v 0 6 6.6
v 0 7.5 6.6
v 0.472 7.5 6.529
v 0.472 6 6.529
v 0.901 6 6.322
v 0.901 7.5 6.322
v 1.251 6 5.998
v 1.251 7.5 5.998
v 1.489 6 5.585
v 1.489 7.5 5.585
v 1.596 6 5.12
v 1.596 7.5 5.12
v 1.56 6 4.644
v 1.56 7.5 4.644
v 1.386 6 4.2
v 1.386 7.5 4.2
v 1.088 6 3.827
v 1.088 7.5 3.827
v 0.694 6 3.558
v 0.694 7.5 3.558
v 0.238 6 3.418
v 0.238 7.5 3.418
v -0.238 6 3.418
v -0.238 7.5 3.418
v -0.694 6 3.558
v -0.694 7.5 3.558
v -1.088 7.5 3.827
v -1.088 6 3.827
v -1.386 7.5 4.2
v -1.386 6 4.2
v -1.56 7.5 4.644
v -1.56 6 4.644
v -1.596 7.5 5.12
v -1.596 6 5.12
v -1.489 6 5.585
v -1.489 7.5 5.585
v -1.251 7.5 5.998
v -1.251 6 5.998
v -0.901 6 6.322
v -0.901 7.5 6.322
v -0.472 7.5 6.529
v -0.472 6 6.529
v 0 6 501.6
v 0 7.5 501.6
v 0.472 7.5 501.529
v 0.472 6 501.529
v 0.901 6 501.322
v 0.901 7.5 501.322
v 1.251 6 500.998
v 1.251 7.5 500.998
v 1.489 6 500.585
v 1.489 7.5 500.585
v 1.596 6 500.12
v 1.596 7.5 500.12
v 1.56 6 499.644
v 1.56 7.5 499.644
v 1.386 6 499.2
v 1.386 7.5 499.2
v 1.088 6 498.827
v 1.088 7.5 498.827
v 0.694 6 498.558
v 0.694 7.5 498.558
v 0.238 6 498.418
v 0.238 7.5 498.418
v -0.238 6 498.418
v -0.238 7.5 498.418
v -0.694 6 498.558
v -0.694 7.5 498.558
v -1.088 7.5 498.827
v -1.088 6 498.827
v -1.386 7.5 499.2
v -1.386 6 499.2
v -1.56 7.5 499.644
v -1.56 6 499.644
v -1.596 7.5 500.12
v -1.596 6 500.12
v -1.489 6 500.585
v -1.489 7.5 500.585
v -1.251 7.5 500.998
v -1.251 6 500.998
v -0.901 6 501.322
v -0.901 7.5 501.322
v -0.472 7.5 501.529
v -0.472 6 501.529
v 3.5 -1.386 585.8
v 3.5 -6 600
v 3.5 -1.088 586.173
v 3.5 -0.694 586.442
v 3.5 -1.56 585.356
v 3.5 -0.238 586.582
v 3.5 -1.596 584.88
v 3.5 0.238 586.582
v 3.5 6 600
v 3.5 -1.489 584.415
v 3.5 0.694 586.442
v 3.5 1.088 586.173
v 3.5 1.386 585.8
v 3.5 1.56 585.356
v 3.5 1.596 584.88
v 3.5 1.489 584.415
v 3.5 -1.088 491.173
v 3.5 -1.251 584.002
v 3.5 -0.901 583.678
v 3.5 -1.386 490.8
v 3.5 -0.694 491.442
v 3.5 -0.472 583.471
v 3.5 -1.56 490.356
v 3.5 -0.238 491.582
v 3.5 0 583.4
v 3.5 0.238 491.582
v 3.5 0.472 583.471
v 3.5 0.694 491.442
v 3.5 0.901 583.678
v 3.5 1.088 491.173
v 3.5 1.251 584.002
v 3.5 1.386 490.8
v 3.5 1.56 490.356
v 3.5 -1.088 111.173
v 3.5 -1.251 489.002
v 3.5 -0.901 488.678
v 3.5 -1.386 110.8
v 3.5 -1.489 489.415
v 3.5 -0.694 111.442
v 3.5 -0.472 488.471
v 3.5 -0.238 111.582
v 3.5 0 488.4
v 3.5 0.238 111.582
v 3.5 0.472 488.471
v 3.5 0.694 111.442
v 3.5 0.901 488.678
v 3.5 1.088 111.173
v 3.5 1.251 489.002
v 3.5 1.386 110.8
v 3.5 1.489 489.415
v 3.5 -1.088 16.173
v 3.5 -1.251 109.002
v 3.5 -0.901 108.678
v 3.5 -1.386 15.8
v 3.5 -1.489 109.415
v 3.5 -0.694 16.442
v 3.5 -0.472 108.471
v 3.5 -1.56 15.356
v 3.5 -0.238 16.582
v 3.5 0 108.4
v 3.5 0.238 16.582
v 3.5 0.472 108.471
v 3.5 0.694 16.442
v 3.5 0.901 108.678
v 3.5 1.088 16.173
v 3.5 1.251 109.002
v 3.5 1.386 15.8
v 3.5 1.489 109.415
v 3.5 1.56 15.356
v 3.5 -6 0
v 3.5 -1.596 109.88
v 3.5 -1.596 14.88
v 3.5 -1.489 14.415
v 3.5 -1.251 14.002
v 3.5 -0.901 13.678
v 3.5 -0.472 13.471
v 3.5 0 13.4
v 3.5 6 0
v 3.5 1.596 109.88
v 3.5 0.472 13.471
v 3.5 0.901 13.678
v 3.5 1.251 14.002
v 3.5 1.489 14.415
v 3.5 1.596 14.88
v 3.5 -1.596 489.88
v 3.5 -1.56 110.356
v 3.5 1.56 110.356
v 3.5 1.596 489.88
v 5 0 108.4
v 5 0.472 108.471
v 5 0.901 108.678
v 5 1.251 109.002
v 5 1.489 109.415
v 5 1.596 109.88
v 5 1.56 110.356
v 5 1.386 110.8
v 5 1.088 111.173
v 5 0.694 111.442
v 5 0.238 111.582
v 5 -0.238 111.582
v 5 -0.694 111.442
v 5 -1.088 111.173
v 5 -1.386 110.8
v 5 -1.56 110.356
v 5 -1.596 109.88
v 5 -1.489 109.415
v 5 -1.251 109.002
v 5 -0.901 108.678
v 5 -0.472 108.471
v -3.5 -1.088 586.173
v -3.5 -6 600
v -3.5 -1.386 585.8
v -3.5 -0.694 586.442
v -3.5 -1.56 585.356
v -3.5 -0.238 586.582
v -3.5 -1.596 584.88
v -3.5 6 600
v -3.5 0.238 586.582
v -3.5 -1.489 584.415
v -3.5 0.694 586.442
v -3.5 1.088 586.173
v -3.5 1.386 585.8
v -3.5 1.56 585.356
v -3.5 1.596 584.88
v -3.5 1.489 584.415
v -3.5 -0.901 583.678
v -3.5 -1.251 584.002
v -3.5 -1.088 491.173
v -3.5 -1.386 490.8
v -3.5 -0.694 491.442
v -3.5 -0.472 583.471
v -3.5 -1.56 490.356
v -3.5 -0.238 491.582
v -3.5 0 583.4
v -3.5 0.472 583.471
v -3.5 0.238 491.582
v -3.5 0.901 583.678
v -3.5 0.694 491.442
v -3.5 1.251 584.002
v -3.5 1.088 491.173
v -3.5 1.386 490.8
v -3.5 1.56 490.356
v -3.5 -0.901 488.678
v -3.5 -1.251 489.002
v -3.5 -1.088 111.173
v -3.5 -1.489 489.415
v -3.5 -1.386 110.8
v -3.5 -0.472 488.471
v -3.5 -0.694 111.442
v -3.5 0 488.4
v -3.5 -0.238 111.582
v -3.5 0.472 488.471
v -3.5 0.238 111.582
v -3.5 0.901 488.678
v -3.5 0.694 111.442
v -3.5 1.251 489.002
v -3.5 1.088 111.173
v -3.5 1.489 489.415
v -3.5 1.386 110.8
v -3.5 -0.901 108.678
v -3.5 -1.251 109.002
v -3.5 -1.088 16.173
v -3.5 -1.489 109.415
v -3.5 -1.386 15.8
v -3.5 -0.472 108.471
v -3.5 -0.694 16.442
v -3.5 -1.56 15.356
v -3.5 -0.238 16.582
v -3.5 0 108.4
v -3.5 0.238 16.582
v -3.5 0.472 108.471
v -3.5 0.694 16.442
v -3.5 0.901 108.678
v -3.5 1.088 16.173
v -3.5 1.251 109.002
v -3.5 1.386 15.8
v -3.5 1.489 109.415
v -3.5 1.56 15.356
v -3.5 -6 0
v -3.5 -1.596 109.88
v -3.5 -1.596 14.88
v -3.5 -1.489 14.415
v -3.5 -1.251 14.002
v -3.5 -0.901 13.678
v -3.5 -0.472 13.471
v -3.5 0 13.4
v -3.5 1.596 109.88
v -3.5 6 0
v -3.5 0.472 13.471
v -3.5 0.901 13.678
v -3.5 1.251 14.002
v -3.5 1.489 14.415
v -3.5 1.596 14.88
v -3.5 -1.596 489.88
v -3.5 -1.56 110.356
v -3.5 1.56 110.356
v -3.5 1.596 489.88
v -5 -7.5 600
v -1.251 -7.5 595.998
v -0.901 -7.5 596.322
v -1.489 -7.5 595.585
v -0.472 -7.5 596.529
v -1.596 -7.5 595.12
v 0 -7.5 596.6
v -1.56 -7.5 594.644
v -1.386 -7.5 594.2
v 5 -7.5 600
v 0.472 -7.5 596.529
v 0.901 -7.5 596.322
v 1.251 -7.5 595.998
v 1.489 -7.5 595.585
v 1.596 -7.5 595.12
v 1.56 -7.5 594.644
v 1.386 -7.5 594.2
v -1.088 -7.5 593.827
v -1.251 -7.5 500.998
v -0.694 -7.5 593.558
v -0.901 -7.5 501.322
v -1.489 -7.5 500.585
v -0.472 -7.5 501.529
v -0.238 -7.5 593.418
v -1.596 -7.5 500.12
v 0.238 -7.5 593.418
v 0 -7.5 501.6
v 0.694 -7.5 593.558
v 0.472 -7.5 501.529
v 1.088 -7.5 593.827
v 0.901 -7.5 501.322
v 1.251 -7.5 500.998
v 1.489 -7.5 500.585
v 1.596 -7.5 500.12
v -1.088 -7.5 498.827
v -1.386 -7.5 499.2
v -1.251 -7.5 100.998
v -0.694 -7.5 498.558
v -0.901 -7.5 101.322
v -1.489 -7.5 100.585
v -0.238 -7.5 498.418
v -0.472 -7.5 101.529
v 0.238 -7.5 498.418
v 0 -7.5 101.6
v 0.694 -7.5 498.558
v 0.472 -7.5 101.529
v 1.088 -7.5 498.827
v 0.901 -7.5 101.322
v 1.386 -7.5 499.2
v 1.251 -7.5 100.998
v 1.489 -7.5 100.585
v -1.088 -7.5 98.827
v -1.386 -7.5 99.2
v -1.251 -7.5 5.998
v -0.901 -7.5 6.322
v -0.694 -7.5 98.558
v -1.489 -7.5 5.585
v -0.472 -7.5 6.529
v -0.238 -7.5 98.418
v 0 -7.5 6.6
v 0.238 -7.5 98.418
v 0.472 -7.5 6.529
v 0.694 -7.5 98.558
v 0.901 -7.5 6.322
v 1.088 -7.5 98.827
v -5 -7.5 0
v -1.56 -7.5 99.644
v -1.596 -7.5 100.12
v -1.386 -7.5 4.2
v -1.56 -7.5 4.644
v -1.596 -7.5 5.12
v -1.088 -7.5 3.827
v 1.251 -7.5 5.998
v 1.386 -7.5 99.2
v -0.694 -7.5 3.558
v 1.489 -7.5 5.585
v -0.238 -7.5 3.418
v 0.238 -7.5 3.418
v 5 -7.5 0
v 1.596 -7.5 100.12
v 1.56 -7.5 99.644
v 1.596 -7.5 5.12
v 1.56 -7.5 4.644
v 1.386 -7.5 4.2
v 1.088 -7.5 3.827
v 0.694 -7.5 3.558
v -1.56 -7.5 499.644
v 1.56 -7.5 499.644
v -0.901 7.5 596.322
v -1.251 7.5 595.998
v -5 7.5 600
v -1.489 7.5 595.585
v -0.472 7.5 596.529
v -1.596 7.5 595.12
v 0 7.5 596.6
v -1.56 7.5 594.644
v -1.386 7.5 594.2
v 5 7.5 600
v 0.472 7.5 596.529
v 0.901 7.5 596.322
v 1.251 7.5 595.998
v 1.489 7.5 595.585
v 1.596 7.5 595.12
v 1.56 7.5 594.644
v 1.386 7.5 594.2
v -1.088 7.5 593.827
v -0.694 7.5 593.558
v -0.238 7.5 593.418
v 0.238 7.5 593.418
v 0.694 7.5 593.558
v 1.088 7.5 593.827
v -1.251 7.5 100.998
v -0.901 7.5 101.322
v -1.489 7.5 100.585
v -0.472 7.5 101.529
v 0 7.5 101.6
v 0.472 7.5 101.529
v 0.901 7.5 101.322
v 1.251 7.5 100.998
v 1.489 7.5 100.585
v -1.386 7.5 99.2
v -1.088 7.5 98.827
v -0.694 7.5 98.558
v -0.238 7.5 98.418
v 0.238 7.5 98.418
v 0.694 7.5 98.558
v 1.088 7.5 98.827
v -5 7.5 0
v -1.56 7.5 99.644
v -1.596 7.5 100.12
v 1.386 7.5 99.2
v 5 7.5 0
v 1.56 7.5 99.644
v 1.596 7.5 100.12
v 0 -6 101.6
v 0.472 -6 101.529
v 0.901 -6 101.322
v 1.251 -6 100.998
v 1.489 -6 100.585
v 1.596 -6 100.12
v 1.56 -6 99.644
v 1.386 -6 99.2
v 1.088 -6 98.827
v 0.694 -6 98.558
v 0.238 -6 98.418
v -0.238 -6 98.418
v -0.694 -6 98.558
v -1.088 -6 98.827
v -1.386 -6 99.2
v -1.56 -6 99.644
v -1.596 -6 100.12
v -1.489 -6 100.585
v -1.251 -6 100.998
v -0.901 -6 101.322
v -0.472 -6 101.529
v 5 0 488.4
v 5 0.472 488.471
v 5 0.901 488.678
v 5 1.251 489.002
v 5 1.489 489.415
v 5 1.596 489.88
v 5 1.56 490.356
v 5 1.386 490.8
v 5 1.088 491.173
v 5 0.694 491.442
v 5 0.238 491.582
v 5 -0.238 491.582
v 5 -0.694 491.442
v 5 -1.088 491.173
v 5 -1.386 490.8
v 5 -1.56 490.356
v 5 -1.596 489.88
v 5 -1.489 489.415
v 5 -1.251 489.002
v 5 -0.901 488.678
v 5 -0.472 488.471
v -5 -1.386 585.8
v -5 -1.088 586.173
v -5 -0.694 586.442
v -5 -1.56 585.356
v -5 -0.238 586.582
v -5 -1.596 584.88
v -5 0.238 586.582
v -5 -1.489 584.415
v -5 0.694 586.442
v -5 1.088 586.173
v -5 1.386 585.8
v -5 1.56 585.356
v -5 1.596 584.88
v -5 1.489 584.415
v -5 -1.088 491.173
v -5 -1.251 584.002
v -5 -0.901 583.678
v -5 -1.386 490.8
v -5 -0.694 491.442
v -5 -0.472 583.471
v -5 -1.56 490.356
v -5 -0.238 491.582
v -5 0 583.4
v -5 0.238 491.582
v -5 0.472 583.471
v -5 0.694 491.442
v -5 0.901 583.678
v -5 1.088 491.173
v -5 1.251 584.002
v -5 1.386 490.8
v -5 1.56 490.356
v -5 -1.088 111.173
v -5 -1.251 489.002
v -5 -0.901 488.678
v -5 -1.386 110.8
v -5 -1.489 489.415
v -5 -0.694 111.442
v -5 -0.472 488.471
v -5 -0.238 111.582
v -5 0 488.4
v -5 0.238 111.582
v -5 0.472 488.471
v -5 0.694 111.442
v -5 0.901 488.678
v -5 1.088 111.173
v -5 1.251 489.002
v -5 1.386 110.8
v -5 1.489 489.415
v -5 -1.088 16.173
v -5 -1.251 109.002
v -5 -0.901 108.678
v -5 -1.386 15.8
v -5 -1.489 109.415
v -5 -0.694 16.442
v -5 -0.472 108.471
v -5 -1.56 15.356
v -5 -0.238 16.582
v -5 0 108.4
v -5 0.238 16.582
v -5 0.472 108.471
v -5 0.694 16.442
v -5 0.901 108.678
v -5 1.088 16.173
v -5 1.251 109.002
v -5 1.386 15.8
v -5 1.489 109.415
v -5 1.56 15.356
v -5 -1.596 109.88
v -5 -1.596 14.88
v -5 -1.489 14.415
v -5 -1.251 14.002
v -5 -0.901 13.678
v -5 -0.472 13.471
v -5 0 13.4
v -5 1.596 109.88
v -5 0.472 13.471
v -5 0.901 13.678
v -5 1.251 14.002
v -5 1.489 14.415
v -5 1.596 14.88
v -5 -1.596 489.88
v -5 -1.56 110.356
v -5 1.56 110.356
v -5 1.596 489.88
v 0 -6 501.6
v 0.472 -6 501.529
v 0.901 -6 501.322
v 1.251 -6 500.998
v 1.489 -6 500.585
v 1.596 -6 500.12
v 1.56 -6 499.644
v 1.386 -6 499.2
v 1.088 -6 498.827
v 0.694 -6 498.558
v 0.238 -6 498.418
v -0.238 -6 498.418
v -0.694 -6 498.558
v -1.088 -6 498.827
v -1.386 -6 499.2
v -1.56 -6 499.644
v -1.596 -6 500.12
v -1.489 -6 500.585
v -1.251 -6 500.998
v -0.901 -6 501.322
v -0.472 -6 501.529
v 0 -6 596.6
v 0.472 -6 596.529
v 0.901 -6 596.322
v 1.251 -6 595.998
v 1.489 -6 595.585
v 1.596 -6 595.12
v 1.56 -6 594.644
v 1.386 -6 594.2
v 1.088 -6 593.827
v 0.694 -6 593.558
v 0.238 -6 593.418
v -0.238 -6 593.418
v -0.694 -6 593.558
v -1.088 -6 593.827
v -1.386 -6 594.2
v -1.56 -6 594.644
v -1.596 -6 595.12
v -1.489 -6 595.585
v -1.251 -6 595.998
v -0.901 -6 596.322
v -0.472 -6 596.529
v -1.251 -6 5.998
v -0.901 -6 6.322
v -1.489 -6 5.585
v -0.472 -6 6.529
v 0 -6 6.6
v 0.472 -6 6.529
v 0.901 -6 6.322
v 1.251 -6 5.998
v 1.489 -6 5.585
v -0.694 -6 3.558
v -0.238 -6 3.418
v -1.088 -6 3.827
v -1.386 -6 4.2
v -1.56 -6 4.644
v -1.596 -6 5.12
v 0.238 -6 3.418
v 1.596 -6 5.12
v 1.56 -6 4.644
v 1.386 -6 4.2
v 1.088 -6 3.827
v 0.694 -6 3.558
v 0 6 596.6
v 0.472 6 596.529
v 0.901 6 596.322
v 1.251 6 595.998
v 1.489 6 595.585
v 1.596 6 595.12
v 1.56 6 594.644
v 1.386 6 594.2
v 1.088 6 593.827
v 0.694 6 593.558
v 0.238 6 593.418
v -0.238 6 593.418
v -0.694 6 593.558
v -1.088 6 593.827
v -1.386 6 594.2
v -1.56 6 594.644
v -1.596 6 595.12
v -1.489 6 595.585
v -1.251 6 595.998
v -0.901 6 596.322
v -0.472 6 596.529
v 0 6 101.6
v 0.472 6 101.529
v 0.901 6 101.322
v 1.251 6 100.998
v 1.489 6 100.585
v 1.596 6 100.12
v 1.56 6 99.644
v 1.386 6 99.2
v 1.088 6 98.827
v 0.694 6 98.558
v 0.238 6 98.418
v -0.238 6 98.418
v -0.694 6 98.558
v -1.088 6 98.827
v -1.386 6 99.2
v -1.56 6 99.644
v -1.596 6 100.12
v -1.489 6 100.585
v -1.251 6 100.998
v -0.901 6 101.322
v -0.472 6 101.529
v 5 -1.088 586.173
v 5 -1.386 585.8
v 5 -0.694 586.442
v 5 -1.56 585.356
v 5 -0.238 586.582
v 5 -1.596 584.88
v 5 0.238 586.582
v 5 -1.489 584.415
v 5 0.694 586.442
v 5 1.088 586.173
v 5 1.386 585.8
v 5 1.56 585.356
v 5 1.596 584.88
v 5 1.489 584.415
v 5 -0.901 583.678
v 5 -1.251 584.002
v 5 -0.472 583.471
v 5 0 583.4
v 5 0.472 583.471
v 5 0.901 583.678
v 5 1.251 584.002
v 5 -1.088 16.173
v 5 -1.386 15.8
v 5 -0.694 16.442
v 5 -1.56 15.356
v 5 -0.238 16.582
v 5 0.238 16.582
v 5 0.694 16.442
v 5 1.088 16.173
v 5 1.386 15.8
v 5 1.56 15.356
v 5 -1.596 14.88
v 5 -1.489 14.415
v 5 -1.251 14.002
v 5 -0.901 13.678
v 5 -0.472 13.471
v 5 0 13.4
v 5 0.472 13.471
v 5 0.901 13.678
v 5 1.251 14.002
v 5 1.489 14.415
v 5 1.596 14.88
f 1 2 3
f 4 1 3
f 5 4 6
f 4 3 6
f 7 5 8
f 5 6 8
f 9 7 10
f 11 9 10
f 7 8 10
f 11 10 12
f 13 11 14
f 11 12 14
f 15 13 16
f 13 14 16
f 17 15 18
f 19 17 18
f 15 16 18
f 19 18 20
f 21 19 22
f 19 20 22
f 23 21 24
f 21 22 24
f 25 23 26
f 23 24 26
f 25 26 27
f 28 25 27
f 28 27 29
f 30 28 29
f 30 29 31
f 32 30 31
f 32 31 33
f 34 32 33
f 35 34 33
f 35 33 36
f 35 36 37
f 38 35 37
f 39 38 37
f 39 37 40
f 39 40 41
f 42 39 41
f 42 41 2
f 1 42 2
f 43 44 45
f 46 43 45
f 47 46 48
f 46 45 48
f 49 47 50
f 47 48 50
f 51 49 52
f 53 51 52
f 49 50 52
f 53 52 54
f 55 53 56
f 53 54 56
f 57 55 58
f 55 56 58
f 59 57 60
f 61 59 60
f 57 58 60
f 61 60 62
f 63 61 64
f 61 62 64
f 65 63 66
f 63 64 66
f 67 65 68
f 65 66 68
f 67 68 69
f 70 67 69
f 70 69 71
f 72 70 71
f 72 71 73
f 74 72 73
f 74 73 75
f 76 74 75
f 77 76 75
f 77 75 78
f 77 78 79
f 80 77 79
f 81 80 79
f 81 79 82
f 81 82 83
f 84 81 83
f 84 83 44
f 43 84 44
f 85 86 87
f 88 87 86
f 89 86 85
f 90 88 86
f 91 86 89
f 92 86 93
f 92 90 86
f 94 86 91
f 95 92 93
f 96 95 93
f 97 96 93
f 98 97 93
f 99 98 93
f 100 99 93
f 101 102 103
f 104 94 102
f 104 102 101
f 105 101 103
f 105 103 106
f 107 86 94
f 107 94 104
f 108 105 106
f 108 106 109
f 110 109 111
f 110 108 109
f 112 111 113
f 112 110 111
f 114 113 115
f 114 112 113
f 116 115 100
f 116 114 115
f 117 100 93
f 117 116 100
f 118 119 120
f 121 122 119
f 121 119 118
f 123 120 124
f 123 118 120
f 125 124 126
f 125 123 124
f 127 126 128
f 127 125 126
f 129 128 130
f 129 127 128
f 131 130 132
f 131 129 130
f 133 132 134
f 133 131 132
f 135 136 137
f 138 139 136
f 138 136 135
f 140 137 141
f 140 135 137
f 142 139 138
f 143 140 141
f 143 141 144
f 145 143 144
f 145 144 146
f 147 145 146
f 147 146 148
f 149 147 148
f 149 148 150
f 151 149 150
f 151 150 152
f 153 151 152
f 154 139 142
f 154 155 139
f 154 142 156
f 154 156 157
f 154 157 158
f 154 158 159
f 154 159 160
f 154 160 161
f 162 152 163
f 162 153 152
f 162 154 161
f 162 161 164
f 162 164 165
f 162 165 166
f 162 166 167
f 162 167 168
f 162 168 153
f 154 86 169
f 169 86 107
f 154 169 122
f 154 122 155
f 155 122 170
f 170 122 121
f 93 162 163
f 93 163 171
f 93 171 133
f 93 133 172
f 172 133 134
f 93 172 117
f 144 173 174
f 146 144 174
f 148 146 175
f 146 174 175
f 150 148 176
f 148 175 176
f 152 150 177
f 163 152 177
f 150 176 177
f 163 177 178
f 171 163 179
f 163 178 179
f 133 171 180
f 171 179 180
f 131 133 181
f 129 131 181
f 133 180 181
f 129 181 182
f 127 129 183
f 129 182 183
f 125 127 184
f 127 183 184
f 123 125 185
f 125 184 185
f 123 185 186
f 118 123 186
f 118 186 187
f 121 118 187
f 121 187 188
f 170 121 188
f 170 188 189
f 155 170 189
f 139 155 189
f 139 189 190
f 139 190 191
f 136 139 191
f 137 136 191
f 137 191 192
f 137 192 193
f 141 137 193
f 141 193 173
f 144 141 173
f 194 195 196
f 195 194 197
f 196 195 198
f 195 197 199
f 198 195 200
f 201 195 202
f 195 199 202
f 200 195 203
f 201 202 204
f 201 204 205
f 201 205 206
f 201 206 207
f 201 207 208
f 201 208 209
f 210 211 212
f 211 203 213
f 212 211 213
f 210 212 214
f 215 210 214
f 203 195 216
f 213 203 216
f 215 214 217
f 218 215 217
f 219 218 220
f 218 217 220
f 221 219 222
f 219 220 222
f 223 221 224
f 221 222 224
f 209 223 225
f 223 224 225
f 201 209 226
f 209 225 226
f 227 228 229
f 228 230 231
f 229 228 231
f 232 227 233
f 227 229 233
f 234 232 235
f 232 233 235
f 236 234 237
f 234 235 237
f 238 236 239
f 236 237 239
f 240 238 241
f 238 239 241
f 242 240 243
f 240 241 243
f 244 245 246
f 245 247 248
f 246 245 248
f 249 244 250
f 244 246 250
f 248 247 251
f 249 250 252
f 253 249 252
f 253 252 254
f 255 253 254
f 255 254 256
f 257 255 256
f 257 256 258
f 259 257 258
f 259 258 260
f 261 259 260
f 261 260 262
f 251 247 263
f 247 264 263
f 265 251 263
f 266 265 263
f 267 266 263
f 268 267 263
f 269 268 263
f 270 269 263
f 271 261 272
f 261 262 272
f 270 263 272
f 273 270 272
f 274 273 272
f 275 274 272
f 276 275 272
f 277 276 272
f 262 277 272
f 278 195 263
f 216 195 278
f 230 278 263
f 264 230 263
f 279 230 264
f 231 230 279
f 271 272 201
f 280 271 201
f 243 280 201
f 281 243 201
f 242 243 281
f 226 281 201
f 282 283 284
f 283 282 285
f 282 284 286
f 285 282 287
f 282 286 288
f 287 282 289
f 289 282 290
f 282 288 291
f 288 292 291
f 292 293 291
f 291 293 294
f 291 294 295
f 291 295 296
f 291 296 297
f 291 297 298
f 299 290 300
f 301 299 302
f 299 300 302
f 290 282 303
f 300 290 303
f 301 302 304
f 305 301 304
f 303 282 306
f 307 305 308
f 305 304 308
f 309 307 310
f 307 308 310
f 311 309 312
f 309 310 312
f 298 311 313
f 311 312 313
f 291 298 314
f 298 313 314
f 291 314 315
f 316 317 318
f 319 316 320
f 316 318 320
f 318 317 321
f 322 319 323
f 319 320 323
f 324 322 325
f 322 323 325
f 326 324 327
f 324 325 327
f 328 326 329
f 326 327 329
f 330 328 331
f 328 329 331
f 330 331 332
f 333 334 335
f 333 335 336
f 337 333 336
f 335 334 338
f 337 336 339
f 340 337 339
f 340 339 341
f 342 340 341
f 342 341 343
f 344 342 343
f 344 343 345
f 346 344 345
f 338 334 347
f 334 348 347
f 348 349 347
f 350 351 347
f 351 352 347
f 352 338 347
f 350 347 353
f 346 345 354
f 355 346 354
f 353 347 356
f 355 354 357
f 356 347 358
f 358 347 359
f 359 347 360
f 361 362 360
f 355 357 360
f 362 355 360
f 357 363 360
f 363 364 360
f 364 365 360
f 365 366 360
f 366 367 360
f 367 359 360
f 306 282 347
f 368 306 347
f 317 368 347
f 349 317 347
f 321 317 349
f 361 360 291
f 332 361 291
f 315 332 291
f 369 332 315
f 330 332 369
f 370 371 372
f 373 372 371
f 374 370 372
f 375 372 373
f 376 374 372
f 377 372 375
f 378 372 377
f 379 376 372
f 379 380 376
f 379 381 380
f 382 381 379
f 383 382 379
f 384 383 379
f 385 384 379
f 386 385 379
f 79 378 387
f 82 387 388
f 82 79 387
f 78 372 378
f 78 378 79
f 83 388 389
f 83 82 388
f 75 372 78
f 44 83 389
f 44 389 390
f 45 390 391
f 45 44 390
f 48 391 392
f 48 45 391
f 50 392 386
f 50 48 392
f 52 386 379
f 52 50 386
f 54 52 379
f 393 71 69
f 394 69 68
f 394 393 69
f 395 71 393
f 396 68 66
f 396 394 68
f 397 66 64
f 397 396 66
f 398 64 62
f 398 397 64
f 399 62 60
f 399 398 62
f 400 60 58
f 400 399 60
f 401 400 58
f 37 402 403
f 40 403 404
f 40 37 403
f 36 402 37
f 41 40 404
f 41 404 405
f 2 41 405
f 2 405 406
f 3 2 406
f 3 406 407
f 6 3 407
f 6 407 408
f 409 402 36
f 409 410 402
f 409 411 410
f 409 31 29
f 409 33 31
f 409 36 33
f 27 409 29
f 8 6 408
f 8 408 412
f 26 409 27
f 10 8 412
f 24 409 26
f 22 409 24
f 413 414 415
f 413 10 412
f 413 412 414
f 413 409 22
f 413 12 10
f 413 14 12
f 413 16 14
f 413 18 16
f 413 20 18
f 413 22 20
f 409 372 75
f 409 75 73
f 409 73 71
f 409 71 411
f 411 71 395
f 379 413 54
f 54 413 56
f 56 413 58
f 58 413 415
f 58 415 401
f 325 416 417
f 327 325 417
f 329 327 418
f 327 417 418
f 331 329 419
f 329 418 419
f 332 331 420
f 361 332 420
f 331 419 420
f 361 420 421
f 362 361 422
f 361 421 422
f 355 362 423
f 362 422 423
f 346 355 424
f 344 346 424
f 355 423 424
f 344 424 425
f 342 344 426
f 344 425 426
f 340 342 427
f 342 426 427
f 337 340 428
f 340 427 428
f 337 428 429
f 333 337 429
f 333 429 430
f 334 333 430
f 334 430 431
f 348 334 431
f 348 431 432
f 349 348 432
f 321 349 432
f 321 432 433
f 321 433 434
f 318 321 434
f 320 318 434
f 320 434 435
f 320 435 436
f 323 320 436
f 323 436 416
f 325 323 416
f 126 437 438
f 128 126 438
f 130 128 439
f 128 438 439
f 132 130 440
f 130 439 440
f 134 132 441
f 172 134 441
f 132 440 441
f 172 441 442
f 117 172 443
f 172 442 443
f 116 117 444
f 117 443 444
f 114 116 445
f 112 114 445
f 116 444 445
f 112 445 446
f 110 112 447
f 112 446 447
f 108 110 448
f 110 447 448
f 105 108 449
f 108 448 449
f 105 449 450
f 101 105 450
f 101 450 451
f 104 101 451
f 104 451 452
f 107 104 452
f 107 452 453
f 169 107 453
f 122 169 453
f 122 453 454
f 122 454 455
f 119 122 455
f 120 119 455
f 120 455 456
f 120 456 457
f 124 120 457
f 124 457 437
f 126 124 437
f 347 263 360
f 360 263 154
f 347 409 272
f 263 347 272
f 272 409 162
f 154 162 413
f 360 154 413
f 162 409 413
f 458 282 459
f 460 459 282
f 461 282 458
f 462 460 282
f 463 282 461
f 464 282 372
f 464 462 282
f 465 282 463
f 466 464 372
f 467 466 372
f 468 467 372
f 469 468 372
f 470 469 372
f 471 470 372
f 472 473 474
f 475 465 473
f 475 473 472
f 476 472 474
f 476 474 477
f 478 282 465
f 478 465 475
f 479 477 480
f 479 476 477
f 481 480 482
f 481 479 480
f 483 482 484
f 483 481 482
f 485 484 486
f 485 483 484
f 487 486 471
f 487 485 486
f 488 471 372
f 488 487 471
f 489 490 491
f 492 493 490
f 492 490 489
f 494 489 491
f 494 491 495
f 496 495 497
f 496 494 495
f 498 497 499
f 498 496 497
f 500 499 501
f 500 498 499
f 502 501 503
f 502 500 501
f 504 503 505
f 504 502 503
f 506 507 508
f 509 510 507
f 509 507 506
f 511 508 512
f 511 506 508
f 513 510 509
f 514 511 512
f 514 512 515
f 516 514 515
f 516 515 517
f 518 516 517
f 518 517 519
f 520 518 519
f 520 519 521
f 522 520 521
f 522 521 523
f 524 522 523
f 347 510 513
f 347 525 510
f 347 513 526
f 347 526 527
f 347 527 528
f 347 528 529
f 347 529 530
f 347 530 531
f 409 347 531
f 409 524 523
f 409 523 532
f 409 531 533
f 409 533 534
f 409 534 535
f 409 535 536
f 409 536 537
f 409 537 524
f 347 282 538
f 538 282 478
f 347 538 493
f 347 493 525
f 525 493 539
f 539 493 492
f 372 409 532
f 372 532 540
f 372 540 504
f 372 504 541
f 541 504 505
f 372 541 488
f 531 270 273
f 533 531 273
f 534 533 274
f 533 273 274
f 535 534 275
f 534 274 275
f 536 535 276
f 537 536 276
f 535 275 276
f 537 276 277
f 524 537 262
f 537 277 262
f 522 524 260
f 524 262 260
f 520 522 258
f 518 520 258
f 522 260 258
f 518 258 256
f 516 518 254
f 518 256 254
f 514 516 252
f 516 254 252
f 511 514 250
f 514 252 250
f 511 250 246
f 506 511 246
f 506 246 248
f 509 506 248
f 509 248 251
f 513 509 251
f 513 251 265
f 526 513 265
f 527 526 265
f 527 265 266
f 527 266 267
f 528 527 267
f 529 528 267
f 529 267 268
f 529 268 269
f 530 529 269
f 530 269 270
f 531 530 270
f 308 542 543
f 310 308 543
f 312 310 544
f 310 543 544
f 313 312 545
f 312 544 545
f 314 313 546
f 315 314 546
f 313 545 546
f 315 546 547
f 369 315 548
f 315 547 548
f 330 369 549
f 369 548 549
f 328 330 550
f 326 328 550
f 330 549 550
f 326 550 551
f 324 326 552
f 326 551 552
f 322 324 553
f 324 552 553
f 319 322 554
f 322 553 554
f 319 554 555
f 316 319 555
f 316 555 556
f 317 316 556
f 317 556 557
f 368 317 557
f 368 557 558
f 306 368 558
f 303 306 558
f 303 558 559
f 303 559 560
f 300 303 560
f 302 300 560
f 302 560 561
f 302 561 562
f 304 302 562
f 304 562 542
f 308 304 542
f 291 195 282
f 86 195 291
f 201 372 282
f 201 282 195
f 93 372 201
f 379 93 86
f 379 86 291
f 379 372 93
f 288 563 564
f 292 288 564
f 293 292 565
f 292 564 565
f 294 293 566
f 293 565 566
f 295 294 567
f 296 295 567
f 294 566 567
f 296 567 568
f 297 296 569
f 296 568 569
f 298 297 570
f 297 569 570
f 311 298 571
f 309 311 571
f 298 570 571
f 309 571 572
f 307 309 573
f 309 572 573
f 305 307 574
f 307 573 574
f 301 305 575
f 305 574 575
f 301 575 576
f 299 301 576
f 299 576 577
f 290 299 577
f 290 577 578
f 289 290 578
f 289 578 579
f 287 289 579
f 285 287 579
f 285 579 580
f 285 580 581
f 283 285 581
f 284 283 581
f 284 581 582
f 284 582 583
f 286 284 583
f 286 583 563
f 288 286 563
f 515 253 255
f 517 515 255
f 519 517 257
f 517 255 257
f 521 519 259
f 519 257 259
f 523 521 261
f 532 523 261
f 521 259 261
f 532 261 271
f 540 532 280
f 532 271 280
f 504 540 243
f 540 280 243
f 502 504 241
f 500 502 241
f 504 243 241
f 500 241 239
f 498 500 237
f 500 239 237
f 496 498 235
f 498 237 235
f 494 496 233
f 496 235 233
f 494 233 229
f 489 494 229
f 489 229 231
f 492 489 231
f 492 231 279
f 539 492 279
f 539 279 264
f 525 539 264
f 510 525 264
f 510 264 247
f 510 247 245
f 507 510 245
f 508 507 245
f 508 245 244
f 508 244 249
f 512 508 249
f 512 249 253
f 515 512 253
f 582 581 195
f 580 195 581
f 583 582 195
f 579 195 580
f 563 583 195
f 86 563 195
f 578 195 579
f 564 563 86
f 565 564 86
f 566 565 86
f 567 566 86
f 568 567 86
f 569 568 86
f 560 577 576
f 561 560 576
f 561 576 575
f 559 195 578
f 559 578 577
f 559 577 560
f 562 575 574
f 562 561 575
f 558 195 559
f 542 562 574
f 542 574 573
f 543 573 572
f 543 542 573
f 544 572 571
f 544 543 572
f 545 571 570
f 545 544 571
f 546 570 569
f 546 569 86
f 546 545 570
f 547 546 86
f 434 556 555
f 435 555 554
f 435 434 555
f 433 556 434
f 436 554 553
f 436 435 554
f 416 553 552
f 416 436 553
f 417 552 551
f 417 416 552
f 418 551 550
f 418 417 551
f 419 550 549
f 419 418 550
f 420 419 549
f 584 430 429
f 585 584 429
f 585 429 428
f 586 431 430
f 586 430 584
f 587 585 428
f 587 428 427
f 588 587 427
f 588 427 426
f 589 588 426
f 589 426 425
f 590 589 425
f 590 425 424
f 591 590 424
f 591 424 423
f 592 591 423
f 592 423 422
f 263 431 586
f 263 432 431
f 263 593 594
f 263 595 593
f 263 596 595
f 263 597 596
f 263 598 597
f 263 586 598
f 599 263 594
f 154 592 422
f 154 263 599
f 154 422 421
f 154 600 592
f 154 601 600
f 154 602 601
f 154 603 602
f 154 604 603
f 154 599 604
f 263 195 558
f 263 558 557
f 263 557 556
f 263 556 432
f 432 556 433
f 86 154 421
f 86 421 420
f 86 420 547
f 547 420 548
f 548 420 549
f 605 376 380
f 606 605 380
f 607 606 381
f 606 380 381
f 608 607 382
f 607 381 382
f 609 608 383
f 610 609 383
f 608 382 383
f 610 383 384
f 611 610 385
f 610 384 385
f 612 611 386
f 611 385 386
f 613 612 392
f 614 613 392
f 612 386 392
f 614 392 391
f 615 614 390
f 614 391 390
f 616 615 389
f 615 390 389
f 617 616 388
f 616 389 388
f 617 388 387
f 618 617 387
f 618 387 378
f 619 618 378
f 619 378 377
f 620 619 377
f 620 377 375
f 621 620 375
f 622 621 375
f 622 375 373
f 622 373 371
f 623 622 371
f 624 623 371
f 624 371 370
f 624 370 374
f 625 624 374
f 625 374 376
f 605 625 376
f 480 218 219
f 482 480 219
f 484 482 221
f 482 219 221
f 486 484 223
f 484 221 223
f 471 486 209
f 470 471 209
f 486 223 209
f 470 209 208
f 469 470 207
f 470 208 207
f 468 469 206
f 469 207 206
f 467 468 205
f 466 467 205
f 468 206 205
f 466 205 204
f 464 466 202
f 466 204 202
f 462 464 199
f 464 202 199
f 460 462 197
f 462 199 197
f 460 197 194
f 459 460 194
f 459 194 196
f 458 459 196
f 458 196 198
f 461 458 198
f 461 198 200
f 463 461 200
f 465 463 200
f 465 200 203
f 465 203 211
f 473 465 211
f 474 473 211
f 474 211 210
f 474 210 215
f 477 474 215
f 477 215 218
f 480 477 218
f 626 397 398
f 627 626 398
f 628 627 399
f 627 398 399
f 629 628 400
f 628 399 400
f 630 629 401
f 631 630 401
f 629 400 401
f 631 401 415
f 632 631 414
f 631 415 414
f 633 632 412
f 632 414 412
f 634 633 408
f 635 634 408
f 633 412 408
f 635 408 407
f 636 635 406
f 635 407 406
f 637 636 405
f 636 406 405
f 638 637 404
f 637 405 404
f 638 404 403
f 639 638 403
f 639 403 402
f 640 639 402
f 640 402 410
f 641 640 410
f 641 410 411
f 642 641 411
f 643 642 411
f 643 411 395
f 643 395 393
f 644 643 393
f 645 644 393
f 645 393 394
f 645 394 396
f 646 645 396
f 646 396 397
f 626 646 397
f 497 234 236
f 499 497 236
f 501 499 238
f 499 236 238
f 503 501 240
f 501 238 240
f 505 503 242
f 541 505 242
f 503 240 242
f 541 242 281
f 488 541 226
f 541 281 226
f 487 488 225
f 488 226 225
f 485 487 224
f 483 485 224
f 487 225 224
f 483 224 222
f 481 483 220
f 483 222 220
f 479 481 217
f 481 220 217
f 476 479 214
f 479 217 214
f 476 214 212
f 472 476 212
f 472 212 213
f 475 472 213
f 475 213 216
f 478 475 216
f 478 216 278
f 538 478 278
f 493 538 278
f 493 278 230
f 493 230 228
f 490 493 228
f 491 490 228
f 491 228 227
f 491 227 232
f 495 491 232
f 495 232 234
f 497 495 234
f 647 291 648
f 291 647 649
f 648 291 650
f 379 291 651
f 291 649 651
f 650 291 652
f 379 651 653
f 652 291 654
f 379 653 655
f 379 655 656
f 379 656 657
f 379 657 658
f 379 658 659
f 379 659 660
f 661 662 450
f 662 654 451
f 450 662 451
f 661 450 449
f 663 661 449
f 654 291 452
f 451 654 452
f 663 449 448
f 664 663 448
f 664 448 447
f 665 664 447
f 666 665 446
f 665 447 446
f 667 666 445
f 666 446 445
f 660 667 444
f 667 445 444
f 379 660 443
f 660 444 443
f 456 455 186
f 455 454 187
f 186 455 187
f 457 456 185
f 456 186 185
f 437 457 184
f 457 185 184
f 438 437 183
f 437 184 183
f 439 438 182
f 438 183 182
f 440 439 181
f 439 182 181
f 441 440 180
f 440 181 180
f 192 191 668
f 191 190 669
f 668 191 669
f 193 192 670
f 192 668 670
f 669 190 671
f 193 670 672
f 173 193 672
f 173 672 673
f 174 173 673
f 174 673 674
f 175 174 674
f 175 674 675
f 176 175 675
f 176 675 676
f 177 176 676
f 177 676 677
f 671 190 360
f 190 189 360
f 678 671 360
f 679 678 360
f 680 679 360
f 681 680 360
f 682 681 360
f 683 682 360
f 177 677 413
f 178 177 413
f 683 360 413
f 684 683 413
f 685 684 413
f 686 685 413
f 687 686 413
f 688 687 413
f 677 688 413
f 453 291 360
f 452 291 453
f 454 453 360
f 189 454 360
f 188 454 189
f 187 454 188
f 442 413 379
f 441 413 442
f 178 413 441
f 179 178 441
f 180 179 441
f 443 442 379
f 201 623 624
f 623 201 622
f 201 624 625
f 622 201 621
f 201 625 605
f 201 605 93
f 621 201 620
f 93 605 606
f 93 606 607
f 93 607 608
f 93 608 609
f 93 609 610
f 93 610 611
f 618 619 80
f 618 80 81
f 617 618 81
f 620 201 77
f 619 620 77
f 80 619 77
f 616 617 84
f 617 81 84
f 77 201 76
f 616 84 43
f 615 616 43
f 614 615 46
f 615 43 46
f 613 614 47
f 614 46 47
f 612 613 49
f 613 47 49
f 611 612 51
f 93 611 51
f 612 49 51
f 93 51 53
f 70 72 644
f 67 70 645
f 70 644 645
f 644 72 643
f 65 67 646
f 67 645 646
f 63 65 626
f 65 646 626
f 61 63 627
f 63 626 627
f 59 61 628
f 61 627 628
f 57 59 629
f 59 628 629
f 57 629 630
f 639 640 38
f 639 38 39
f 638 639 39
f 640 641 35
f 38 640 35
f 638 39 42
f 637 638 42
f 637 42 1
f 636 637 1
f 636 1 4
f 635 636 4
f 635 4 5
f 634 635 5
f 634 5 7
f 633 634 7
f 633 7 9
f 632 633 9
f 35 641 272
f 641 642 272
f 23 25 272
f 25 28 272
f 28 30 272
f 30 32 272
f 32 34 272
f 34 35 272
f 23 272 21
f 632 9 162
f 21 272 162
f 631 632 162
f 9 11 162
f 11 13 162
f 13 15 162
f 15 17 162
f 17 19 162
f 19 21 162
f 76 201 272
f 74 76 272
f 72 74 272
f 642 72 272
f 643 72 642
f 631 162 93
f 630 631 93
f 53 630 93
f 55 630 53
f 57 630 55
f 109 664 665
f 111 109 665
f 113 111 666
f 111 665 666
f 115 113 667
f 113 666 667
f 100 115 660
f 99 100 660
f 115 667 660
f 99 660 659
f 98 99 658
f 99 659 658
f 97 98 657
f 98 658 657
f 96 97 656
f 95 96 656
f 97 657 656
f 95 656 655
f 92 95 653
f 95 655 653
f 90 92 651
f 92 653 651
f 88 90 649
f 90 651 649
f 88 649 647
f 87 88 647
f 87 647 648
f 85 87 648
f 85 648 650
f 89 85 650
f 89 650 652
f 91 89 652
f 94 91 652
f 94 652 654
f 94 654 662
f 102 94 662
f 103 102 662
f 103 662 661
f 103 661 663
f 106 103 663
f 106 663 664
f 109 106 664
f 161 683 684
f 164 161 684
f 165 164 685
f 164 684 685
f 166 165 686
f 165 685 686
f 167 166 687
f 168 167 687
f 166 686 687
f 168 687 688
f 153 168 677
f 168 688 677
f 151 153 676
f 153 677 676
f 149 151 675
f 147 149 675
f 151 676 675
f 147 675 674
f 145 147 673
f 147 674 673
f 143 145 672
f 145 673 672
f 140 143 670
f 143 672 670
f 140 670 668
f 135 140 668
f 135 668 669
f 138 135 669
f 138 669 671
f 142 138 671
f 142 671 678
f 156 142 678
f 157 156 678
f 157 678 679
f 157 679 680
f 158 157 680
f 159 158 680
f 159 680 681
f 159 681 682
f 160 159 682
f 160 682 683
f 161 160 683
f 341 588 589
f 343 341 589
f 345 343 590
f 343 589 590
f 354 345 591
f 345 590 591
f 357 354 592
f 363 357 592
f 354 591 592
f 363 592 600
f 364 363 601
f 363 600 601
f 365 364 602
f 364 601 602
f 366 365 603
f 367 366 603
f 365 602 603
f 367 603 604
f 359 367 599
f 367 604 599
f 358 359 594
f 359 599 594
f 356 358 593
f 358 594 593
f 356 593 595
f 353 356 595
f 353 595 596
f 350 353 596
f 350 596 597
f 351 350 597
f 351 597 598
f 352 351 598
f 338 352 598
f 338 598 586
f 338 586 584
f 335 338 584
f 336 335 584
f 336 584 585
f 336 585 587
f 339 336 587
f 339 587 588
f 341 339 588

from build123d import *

# Parameters (mm, degrees)
SKETCH_1_W          = 10
SKETCH_1_H          = 15
SKETCH_1_W_2        = 7
SKETCH_1_H_2        = 12
EXTRUDE_1_DEPTH     = 600
SKETCH_2_R          = 1.6
CUT_EXTRUDE_1_DEPTH = 601.208297177
SKETCH_3_R          = 1.6
CUT_EXTRUDE_2_DEPTH = 601.130194208


with BuildPart() as part:
    # ｽｹｯﾁ1 → 押し出し-薄板1 (new body)
    with BuildSketch(Plane.XY):
        Rectangle(SKETCH_1_W, SKETCH_1_H)
        Rectangle(SKETCH_1_W_2, SKETCH_1_H_2, mode=Mode.SUBTRACT)
    extrude(amount=EXTRUDE_1_DEPTH)

    # ｽｹｯﾁ2 → ｶｯﾄ - 押し出し1 (cut, through all)
    with BuildSketch(Plane(origin=(0, 7.5, 0), x_dir=(1, 0, 0), z_dir=(0, 1, 0))):
        with Locations(Location((0, -595, 0), (0, 0, 270))):
            Circle(SKETCH_2_R)
        with Locations(Location((0, -5, 0), (0, 0, 270))):
            Circle(SKETCH_2_R)
        with Locations(Location((0, -500, 0), (0, 0, 270))):
            Circle(SKETCH_2_R)
        with Locations(Location((0, -100, 0), (0, 0, 270))):
            Circle(SKETCH_2_R)
    extrude(amount=-CUT_EXTRUDE_1_DEPTH, mode=Mode.SUBTRACT)

    # ｽｹｯﾁ3 → ｶｯﾄ - 押し出し2 (cut, through all)
    with BuildSketch(Plane(origin=(5, 0, 0), x_dir=(0, 0, -1), z_dir=(1, 0, 0))):
        with Locations((-585, 0)):
            Circle(SKETCH_3_R)
        with Locations((-15, 0)):
            Circle(SKETCH_3_R)
        with Locations((-490, 0)):
            Circle(SKETCH_3_R)
        with Locations((-110, 0)):
            Circle(SKETCH_3_R)
    extrude(amount=-CUT_EXTRUDE_2_DEPTH, mode=Mode.SUBTRACT)


solid = part.part
